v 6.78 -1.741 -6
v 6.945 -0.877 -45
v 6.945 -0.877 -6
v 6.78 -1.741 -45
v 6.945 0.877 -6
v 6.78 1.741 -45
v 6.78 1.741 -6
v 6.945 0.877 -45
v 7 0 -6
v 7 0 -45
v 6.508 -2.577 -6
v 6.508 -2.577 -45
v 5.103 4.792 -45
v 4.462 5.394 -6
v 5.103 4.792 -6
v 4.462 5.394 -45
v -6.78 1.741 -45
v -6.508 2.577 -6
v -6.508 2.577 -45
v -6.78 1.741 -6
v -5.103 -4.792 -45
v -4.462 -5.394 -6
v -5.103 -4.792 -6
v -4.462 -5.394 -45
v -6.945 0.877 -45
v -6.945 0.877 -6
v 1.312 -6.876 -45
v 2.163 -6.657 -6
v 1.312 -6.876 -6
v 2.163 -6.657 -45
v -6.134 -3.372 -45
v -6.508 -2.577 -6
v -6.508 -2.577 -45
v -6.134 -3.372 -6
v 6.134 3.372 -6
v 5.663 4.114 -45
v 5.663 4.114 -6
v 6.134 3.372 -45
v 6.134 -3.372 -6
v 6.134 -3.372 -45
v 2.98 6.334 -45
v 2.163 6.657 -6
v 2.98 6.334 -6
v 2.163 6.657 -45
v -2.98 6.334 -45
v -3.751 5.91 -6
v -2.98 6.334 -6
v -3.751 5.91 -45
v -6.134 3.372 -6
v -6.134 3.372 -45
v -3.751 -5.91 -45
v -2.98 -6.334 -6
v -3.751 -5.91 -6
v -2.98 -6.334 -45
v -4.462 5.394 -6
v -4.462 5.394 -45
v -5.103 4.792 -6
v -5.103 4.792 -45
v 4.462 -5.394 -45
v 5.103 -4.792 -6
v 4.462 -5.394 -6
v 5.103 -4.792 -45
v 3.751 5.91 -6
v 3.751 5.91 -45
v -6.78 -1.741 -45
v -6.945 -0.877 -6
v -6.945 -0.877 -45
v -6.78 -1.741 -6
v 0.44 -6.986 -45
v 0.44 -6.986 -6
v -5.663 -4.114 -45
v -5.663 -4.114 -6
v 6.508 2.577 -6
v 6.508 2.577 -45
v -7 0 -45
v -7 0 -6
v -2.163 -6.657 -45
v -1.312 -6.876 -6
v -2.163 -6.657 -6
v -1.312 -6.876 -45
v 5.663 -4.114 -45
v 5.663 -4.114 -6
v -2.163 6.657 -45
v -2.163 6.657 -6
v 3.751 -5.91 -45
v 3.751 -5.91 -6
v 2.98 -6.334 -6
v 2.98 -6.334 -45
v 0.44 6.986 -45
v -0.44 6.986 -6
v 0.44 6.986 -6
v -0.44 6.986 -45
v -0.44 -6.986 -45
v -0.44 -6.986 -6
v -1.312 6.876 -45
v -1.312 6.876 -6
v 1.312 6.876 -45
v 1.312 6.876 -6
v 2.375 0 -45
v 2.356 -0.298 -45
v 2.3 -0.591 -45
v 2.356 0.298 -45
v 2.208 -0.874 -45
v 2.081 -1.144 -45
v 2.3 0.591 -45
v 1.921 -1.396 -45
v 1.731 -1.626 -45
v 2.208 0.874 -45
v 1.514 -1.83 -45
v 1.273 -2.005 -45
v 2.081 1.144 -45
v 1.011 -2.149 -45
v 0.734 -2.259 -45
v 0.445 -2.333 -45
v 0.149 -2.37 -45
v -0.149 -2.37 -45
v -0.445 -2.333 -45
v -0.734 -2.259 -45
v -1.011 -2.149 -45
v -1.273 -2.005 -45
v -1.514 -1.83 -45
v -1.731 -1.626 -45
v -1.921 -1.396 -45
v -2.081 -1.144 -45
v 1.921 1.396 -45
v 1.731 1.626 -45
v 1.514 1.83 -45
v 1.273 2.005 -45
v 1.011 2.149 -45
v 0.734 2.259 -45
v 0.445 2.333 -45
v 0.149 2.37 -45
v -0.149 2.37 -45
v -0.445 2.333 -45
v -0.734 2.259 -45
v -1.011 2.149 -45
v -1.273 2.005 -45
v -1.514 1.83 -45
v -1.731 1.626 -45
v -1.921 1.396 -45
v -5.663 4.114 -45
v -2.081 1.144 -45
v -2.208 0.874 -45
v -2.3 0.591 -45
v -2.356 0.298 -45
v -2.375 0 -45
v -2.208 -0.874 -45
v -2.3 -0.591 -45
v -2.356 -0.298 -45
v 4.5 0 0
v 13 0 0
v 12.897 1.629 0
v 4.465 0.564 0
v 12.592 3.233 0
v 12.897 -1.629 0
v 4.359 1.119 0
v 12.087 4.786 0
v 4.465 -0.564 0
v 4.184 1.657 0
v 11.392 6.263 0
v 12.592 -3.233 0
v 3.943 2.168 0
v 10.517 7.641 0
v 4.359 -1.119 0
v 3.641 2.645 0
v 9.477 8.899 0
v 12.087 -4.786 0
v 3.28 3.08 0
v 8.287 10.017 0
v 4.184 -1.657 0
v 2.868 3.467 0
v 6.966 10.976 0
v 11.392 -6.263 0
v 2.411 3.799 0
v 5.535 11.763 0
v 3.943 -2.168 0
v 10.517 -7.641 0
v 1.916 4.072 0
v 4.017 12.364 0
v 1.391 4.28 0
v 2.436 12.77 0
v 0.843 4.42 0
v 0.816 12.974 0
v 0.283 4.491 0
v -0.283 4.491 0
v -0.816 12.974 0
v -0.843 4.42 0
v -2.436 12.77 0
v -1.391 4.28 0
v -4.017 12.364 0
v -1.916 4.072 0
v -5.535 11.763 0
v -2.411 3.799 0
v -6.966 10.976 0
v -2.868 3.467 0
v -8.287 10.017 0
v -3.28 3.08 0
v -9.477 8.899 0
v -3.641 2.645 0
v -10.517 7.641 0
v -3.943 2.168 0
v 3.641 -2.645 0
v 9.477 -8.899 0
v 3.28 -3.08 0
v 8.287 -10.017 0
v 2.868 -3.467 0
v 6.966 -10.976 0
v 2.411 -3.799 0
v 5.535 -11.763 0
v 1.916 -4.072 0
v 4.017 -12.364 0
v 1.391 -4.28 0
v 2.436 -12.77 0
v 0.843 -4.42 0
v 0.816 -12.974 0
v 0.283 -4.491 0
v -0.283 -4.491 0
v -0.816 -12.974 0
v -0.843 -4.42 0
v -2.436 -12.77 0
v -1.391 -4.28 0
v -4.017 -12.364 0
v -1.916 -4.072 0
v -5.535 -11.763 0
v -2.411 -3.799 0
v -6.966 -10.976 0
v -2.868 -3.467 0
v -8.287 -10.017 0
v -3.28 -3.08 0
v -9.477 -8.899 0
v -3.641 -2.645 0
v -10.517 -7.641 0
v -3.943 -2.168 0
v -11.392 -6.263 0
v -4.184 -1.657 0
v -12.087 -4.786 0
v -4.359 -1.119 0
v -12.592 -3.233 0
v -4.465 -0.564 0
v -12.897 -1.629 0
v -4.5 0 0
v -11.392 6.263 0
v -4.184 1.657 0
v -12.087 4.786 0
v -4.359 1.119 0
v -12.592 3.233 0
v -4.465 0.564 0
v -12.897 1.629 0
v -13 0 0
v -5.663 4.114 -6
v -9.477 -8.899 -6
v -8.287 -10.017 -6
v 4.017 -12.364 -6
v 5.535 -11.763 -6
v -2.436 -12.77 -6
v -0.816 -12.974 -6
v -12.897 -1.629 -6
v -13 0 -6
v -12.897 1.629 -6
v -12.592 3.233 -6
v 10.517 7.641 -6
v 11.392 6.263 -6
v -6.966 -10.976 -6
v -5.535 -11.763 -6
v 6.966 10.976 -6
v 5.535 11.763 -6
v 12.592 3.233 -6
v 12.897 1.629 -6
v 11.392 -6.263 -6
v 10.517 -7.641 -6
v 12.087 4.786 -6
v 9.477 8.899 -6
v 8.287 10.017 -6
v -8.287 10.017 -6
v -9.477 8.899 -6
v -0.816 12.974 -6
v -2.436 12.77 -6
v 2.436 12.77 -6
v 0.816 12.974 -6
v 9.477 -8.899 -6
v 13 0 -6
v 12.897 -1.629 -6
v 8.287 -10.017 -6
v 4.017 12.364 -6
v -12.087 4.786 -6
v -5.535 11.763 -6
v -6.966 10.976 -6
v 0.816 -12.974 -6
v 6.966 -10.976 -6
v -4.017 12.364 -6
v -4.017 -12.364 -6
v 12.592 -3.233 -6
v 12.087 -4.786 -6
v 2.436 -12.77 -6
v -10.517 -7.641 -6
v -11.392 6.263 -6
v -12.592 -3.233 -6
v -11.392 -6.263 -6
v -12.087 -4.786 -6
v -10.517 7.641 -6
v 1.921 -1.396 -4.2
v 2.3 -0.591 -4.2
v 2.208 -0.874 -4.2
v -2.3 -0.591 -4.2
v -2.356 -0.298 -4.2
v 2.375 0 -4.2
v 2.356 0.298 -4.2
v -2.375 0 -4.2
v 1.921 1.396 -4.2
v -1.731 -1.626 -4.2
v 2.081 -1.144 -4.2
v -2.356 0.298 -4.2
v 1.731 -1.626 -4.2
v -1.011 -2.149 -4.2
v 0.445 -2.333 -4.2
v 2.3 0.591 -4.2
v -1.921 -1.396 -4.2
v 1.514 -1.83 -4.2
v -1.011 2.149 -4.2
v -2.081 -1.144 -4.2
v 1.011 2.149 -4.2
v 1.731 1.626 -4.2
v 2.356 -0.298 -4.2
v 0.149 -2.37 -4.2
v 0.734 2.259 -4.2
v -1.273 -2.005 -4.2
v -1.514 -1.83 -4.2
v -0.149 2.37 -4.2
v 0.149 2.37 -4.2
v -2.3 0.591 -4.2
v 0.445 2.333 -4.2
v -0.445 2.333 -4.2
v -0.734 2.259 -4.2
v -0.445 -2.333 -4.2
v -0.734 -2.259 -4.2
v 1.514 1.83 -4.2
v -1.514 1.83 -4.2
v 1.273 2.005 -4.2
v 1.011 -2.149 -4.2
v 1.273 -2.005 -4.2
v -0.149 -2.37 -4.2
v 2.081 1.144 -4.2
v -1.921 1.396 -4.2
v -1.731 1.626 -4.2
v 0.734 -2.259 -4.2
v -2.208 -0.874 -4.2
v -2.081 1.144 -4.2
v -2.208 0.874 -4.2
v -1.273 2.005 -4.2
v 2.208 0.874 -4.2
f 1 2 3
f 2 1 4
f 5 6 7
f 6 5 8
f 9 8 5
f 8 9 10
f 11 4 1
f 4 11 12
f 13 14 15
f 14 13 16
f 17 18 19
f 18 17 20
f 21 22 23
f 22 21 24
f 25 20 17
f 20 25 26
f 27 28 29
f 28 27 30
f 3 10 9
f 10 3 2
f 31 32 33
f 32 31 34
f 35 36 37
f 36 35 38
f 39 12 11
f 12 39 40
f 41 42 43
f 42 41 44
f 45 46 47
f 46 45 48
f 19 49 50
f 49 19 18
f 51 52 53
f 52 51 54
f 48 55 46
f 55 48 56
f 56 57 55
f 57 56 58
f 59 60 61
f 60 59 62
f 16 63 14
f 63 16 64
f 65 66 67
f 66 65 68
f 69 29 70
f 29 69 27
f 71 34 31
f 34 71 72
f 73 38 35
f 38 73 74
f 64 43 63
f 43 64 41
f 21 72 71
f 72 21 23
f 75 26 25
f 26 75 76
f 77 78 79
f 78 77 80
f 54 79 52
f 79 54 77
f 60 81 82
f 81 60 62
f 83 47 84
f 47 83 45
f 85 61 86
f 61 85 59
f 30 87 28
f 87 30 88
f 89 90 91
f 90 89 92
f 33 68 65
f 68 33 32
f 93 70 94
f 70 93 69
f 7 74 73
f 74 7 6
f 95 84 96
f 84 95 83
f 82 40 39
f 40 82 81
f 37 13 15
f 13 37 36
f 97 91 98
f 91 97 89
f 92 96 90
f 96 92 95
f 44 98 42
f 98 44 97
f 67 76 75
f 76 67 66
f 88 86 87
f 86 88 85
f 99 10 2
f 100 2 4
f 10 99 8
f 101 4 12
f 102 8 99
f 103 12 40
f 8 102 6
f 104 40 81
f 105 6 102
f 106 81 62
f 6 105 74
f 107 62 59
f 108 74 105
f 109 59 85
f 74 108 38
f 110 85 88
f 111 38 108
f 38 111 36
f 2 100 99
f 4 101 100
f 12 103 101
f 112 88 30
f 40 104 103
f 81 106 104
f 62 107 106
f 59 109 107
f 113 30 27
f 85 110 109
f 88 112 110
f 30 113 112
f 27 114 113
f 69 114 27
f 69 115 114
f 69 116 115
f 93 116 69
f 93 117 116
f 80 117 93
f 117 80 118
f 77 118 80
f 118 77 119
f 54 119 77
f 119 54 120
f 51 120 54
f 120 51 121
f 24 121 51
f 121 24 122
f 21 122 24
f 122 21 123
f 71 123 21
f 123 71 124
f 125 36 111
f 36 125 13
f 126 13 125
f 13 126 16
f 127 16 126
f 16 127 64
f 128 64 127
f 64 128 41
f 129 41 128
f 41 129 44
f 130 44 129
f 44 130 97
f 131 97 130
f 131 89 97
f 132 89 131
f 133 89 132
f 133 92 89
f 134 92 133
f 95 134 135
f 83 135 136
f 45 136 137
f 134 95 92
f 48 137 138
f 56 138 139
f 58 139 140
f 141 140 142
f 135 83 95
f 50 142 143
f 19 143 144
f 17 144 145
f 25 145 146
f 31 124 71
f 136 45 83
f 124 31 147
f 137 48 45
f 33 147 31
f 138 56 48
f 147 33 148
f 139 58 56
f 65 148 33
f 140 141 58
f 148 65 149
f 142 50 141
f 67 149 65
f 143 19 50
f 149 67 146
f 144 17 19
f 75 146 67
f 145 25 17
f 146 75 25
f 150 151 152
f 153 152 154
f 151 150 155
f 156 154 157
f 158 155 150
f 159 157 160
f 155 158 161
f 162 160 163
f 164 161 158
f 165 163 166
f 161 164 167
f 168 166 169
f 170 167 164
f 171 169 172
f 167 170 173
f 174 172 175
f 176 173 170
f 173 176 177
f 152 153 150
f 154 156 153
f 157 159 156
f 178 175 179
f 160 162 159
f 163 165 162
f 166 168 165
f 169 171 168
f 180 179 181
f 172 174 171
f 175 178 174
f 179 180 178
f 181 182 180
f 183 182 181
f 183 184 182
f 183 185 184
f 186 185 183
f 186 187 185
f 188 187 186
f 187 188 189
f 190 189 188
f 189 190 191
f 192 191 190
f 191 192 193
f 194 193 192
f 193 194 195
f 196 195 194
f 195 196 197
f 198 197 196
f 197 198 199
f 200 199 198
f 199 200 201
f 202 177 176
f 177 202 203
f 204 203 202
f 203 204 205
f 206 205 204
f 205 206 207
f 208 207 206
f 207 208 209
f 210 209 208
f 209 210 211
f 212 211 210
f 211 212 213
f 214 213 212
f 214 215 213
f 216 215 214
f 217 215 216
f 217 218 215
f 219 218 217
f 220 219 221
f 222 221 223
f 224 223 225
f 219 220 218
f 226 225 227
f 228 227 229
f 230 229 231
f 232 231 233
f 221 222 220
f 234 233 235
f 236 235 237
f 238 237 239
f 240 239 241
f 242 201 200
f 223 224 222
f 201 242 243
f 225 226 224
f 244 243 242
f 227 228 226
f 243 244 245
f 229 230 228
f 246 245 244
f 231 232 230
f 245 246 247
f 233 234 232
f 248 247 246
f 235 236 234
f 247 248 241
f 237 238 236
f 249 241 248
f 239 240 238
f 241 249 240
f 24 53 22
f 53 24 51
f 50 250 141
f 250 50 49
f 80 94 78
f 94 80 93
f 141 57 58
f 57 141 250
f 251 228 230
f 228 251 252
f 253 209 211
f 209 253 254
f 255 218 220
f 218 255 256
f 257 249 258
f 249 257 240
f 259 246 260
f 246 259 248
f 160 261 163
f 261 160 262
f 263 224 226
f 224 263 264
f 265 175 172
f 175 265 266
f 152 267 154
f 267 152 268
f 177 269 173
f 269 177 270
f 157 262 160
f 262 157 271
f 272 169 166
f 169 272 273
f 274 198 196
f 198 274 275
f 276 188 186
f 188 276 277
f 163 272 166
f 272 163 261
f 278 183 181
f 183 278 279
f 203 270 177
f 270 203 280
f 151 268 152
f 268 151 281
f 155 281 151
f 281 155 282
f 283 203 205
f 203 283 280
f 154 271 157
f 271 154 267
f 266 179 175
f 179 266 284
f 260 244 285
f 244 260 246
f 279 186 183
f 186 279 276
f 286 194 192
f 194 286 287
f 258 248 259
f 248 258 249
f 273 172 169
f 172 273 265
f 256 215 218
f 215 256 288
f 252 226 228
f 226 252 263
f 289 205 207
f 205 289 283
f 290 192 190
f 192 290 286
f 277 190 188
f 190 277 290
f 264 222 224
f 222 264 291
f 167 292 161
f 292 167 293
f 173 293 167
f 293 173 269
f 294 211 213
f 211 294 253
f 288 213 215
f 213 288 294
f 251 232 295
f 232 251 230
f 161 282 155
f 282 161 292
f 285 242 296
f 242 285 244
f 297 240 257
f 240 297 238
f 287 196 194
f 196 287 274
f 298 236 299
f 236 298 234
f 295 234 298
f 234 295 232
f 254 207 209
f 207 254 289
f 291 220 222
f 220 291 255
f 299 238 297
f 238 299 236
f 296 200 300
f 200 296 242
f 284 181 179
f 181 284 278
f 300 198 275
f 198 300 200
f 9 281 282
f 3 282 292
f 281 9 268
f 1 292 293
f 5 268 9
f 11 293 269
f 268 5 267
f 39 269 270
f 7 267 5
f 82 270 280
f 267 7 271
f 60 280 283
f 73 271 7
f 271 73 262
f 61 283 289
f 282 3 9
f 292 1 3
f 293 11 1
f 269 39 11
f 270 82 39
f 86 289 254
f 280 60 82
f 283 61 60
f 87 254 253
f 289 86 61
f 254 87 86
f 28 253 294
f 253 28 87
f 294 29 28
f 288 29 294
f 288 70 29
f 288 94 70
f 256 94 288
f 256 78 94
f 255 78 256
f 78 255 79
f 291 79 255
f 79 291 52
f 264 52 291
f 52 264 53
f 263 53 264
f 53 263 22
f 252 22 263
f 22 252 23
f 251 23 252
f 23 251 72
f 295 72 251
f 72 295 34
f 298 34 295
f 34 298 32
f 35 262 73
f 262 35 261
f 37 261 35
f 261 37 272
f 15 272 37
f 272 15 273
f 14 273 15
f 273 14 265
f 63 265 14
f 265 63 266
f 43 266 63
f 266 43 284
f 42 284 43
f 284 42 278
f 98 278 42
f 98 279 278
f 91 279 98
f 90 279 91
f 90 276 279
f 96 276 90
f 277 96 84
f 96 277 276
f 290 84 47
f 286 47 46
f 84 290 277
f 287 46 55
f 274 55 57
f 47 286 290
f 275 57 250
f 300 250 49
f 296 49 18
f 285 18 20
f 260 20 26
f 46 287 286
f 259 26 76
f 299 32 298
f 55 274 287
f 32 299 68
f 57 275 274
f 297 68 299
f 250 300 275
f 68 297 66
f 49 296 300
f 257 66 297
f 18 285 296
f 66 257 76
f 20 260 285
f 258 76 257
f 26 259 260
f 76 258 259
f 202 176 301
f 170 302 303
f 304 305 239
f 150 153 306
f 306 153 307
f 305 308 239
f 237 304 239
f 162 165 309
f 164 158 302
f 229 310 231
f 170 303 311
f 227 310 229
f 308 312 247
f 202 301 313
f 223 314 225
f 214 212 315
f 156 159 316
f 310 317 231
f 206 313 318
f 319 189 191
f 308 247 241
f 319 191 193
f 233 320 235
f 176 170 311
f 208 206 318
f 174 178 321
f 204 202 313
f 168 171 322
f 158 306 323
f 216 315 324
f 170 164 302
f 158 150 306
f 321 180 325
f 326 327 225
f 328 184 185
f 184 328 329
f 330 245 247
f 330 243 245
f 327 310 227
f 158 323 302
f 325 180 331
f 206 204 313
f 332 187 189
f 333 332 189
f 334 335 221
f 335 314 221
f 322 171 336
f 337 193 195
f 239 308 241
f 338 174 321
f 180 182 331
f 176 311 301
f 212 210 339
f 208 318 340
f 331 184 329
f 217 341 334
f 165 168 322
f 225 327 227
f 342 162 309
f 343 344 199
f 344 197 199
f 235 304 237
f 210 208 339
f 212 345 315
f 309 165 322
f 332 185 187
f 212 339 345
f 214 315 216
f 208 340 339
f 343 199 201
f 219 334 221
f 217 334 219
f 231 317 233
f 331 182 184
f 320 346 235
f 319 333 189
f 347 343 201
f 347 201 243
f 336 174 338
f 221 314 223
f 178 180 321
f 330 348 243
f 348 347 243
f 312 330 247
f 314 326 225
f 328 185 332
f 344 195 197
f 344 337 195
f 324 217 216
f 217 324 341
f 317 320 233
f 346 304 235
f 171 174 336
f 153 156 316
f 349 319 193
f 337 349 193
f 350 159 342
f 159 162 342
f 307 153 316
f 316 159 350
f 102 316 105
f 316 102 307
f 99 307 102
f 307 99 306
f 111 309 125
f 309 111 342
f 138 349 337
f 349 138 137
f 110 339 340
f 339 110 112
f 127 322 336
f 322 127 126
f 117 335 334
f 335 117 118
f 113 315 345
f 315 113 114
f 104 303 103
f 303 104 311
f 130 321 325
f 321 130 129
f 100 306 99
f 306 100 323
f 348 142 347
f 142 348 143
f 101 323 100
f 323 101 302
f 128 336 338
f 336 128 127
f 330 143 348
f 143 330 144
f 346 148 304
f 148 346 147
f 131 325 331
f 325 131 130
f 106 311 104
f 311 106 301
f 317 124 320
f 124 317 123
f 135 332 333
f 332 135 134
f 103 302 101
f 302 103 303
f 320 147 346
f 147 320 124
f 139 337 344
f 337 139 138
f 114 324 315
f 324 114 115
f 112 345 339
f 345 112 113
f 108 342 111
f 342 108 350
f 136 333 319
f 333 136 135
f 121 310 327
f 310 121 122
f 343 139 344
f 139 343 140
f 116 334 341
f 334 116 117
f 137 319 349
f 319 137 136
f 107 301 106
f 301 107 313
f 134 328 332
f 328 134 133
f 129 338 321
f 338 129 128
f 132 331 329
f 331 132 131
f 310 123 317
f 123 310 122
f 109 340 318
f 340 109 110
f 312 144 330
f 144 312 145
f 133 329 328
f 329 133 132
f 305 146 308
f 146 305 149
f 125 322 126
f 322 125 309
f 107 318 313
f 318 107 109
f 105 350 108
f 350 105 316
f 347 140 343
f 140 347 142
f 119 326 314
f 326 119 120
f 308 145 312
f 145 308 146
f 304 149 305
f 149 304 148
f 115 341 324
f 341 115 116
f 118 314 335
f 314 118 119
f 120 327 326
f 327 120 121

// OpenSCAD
$fn = 50;


difference() {
	union() {
		translate(v = [0, 0, -45.0000000000]) {
			cylinder(h = 45, r = 7.0000000000);
		}
		translate(v = [0, 0, -6.0000000000]) {
			cylinder(h = 6, r = 13.0000000000);
		}
	}
	union() {
		translate(v = [0, 0, 0]) {
			rotate(a = [0, 0, 0]) {
				difference() {
					union() {
						#translate(v = [0, 0, -45.0000000000]) {
							cylinder(h = 45, r = 2.2500000000);
						}
						#translate(v = [0, 0, -4.2000000000]) {
							cylinder(h = 4.2000000000, r = 7.0000000000, r1 = 2.3750000000, r2 = 4.5000000000);
						}
						#translate(v = [0, 0, -45.0000000000]) {
							cylinder(h = 45, r = 2.3750000000);
						}
						#translate(v = [0, 0, -45.0000000000]) {
							cylinder(h = 45, r = 2.2500000000);
						}
					}
					union();
				}
			}
		}
	}
}
